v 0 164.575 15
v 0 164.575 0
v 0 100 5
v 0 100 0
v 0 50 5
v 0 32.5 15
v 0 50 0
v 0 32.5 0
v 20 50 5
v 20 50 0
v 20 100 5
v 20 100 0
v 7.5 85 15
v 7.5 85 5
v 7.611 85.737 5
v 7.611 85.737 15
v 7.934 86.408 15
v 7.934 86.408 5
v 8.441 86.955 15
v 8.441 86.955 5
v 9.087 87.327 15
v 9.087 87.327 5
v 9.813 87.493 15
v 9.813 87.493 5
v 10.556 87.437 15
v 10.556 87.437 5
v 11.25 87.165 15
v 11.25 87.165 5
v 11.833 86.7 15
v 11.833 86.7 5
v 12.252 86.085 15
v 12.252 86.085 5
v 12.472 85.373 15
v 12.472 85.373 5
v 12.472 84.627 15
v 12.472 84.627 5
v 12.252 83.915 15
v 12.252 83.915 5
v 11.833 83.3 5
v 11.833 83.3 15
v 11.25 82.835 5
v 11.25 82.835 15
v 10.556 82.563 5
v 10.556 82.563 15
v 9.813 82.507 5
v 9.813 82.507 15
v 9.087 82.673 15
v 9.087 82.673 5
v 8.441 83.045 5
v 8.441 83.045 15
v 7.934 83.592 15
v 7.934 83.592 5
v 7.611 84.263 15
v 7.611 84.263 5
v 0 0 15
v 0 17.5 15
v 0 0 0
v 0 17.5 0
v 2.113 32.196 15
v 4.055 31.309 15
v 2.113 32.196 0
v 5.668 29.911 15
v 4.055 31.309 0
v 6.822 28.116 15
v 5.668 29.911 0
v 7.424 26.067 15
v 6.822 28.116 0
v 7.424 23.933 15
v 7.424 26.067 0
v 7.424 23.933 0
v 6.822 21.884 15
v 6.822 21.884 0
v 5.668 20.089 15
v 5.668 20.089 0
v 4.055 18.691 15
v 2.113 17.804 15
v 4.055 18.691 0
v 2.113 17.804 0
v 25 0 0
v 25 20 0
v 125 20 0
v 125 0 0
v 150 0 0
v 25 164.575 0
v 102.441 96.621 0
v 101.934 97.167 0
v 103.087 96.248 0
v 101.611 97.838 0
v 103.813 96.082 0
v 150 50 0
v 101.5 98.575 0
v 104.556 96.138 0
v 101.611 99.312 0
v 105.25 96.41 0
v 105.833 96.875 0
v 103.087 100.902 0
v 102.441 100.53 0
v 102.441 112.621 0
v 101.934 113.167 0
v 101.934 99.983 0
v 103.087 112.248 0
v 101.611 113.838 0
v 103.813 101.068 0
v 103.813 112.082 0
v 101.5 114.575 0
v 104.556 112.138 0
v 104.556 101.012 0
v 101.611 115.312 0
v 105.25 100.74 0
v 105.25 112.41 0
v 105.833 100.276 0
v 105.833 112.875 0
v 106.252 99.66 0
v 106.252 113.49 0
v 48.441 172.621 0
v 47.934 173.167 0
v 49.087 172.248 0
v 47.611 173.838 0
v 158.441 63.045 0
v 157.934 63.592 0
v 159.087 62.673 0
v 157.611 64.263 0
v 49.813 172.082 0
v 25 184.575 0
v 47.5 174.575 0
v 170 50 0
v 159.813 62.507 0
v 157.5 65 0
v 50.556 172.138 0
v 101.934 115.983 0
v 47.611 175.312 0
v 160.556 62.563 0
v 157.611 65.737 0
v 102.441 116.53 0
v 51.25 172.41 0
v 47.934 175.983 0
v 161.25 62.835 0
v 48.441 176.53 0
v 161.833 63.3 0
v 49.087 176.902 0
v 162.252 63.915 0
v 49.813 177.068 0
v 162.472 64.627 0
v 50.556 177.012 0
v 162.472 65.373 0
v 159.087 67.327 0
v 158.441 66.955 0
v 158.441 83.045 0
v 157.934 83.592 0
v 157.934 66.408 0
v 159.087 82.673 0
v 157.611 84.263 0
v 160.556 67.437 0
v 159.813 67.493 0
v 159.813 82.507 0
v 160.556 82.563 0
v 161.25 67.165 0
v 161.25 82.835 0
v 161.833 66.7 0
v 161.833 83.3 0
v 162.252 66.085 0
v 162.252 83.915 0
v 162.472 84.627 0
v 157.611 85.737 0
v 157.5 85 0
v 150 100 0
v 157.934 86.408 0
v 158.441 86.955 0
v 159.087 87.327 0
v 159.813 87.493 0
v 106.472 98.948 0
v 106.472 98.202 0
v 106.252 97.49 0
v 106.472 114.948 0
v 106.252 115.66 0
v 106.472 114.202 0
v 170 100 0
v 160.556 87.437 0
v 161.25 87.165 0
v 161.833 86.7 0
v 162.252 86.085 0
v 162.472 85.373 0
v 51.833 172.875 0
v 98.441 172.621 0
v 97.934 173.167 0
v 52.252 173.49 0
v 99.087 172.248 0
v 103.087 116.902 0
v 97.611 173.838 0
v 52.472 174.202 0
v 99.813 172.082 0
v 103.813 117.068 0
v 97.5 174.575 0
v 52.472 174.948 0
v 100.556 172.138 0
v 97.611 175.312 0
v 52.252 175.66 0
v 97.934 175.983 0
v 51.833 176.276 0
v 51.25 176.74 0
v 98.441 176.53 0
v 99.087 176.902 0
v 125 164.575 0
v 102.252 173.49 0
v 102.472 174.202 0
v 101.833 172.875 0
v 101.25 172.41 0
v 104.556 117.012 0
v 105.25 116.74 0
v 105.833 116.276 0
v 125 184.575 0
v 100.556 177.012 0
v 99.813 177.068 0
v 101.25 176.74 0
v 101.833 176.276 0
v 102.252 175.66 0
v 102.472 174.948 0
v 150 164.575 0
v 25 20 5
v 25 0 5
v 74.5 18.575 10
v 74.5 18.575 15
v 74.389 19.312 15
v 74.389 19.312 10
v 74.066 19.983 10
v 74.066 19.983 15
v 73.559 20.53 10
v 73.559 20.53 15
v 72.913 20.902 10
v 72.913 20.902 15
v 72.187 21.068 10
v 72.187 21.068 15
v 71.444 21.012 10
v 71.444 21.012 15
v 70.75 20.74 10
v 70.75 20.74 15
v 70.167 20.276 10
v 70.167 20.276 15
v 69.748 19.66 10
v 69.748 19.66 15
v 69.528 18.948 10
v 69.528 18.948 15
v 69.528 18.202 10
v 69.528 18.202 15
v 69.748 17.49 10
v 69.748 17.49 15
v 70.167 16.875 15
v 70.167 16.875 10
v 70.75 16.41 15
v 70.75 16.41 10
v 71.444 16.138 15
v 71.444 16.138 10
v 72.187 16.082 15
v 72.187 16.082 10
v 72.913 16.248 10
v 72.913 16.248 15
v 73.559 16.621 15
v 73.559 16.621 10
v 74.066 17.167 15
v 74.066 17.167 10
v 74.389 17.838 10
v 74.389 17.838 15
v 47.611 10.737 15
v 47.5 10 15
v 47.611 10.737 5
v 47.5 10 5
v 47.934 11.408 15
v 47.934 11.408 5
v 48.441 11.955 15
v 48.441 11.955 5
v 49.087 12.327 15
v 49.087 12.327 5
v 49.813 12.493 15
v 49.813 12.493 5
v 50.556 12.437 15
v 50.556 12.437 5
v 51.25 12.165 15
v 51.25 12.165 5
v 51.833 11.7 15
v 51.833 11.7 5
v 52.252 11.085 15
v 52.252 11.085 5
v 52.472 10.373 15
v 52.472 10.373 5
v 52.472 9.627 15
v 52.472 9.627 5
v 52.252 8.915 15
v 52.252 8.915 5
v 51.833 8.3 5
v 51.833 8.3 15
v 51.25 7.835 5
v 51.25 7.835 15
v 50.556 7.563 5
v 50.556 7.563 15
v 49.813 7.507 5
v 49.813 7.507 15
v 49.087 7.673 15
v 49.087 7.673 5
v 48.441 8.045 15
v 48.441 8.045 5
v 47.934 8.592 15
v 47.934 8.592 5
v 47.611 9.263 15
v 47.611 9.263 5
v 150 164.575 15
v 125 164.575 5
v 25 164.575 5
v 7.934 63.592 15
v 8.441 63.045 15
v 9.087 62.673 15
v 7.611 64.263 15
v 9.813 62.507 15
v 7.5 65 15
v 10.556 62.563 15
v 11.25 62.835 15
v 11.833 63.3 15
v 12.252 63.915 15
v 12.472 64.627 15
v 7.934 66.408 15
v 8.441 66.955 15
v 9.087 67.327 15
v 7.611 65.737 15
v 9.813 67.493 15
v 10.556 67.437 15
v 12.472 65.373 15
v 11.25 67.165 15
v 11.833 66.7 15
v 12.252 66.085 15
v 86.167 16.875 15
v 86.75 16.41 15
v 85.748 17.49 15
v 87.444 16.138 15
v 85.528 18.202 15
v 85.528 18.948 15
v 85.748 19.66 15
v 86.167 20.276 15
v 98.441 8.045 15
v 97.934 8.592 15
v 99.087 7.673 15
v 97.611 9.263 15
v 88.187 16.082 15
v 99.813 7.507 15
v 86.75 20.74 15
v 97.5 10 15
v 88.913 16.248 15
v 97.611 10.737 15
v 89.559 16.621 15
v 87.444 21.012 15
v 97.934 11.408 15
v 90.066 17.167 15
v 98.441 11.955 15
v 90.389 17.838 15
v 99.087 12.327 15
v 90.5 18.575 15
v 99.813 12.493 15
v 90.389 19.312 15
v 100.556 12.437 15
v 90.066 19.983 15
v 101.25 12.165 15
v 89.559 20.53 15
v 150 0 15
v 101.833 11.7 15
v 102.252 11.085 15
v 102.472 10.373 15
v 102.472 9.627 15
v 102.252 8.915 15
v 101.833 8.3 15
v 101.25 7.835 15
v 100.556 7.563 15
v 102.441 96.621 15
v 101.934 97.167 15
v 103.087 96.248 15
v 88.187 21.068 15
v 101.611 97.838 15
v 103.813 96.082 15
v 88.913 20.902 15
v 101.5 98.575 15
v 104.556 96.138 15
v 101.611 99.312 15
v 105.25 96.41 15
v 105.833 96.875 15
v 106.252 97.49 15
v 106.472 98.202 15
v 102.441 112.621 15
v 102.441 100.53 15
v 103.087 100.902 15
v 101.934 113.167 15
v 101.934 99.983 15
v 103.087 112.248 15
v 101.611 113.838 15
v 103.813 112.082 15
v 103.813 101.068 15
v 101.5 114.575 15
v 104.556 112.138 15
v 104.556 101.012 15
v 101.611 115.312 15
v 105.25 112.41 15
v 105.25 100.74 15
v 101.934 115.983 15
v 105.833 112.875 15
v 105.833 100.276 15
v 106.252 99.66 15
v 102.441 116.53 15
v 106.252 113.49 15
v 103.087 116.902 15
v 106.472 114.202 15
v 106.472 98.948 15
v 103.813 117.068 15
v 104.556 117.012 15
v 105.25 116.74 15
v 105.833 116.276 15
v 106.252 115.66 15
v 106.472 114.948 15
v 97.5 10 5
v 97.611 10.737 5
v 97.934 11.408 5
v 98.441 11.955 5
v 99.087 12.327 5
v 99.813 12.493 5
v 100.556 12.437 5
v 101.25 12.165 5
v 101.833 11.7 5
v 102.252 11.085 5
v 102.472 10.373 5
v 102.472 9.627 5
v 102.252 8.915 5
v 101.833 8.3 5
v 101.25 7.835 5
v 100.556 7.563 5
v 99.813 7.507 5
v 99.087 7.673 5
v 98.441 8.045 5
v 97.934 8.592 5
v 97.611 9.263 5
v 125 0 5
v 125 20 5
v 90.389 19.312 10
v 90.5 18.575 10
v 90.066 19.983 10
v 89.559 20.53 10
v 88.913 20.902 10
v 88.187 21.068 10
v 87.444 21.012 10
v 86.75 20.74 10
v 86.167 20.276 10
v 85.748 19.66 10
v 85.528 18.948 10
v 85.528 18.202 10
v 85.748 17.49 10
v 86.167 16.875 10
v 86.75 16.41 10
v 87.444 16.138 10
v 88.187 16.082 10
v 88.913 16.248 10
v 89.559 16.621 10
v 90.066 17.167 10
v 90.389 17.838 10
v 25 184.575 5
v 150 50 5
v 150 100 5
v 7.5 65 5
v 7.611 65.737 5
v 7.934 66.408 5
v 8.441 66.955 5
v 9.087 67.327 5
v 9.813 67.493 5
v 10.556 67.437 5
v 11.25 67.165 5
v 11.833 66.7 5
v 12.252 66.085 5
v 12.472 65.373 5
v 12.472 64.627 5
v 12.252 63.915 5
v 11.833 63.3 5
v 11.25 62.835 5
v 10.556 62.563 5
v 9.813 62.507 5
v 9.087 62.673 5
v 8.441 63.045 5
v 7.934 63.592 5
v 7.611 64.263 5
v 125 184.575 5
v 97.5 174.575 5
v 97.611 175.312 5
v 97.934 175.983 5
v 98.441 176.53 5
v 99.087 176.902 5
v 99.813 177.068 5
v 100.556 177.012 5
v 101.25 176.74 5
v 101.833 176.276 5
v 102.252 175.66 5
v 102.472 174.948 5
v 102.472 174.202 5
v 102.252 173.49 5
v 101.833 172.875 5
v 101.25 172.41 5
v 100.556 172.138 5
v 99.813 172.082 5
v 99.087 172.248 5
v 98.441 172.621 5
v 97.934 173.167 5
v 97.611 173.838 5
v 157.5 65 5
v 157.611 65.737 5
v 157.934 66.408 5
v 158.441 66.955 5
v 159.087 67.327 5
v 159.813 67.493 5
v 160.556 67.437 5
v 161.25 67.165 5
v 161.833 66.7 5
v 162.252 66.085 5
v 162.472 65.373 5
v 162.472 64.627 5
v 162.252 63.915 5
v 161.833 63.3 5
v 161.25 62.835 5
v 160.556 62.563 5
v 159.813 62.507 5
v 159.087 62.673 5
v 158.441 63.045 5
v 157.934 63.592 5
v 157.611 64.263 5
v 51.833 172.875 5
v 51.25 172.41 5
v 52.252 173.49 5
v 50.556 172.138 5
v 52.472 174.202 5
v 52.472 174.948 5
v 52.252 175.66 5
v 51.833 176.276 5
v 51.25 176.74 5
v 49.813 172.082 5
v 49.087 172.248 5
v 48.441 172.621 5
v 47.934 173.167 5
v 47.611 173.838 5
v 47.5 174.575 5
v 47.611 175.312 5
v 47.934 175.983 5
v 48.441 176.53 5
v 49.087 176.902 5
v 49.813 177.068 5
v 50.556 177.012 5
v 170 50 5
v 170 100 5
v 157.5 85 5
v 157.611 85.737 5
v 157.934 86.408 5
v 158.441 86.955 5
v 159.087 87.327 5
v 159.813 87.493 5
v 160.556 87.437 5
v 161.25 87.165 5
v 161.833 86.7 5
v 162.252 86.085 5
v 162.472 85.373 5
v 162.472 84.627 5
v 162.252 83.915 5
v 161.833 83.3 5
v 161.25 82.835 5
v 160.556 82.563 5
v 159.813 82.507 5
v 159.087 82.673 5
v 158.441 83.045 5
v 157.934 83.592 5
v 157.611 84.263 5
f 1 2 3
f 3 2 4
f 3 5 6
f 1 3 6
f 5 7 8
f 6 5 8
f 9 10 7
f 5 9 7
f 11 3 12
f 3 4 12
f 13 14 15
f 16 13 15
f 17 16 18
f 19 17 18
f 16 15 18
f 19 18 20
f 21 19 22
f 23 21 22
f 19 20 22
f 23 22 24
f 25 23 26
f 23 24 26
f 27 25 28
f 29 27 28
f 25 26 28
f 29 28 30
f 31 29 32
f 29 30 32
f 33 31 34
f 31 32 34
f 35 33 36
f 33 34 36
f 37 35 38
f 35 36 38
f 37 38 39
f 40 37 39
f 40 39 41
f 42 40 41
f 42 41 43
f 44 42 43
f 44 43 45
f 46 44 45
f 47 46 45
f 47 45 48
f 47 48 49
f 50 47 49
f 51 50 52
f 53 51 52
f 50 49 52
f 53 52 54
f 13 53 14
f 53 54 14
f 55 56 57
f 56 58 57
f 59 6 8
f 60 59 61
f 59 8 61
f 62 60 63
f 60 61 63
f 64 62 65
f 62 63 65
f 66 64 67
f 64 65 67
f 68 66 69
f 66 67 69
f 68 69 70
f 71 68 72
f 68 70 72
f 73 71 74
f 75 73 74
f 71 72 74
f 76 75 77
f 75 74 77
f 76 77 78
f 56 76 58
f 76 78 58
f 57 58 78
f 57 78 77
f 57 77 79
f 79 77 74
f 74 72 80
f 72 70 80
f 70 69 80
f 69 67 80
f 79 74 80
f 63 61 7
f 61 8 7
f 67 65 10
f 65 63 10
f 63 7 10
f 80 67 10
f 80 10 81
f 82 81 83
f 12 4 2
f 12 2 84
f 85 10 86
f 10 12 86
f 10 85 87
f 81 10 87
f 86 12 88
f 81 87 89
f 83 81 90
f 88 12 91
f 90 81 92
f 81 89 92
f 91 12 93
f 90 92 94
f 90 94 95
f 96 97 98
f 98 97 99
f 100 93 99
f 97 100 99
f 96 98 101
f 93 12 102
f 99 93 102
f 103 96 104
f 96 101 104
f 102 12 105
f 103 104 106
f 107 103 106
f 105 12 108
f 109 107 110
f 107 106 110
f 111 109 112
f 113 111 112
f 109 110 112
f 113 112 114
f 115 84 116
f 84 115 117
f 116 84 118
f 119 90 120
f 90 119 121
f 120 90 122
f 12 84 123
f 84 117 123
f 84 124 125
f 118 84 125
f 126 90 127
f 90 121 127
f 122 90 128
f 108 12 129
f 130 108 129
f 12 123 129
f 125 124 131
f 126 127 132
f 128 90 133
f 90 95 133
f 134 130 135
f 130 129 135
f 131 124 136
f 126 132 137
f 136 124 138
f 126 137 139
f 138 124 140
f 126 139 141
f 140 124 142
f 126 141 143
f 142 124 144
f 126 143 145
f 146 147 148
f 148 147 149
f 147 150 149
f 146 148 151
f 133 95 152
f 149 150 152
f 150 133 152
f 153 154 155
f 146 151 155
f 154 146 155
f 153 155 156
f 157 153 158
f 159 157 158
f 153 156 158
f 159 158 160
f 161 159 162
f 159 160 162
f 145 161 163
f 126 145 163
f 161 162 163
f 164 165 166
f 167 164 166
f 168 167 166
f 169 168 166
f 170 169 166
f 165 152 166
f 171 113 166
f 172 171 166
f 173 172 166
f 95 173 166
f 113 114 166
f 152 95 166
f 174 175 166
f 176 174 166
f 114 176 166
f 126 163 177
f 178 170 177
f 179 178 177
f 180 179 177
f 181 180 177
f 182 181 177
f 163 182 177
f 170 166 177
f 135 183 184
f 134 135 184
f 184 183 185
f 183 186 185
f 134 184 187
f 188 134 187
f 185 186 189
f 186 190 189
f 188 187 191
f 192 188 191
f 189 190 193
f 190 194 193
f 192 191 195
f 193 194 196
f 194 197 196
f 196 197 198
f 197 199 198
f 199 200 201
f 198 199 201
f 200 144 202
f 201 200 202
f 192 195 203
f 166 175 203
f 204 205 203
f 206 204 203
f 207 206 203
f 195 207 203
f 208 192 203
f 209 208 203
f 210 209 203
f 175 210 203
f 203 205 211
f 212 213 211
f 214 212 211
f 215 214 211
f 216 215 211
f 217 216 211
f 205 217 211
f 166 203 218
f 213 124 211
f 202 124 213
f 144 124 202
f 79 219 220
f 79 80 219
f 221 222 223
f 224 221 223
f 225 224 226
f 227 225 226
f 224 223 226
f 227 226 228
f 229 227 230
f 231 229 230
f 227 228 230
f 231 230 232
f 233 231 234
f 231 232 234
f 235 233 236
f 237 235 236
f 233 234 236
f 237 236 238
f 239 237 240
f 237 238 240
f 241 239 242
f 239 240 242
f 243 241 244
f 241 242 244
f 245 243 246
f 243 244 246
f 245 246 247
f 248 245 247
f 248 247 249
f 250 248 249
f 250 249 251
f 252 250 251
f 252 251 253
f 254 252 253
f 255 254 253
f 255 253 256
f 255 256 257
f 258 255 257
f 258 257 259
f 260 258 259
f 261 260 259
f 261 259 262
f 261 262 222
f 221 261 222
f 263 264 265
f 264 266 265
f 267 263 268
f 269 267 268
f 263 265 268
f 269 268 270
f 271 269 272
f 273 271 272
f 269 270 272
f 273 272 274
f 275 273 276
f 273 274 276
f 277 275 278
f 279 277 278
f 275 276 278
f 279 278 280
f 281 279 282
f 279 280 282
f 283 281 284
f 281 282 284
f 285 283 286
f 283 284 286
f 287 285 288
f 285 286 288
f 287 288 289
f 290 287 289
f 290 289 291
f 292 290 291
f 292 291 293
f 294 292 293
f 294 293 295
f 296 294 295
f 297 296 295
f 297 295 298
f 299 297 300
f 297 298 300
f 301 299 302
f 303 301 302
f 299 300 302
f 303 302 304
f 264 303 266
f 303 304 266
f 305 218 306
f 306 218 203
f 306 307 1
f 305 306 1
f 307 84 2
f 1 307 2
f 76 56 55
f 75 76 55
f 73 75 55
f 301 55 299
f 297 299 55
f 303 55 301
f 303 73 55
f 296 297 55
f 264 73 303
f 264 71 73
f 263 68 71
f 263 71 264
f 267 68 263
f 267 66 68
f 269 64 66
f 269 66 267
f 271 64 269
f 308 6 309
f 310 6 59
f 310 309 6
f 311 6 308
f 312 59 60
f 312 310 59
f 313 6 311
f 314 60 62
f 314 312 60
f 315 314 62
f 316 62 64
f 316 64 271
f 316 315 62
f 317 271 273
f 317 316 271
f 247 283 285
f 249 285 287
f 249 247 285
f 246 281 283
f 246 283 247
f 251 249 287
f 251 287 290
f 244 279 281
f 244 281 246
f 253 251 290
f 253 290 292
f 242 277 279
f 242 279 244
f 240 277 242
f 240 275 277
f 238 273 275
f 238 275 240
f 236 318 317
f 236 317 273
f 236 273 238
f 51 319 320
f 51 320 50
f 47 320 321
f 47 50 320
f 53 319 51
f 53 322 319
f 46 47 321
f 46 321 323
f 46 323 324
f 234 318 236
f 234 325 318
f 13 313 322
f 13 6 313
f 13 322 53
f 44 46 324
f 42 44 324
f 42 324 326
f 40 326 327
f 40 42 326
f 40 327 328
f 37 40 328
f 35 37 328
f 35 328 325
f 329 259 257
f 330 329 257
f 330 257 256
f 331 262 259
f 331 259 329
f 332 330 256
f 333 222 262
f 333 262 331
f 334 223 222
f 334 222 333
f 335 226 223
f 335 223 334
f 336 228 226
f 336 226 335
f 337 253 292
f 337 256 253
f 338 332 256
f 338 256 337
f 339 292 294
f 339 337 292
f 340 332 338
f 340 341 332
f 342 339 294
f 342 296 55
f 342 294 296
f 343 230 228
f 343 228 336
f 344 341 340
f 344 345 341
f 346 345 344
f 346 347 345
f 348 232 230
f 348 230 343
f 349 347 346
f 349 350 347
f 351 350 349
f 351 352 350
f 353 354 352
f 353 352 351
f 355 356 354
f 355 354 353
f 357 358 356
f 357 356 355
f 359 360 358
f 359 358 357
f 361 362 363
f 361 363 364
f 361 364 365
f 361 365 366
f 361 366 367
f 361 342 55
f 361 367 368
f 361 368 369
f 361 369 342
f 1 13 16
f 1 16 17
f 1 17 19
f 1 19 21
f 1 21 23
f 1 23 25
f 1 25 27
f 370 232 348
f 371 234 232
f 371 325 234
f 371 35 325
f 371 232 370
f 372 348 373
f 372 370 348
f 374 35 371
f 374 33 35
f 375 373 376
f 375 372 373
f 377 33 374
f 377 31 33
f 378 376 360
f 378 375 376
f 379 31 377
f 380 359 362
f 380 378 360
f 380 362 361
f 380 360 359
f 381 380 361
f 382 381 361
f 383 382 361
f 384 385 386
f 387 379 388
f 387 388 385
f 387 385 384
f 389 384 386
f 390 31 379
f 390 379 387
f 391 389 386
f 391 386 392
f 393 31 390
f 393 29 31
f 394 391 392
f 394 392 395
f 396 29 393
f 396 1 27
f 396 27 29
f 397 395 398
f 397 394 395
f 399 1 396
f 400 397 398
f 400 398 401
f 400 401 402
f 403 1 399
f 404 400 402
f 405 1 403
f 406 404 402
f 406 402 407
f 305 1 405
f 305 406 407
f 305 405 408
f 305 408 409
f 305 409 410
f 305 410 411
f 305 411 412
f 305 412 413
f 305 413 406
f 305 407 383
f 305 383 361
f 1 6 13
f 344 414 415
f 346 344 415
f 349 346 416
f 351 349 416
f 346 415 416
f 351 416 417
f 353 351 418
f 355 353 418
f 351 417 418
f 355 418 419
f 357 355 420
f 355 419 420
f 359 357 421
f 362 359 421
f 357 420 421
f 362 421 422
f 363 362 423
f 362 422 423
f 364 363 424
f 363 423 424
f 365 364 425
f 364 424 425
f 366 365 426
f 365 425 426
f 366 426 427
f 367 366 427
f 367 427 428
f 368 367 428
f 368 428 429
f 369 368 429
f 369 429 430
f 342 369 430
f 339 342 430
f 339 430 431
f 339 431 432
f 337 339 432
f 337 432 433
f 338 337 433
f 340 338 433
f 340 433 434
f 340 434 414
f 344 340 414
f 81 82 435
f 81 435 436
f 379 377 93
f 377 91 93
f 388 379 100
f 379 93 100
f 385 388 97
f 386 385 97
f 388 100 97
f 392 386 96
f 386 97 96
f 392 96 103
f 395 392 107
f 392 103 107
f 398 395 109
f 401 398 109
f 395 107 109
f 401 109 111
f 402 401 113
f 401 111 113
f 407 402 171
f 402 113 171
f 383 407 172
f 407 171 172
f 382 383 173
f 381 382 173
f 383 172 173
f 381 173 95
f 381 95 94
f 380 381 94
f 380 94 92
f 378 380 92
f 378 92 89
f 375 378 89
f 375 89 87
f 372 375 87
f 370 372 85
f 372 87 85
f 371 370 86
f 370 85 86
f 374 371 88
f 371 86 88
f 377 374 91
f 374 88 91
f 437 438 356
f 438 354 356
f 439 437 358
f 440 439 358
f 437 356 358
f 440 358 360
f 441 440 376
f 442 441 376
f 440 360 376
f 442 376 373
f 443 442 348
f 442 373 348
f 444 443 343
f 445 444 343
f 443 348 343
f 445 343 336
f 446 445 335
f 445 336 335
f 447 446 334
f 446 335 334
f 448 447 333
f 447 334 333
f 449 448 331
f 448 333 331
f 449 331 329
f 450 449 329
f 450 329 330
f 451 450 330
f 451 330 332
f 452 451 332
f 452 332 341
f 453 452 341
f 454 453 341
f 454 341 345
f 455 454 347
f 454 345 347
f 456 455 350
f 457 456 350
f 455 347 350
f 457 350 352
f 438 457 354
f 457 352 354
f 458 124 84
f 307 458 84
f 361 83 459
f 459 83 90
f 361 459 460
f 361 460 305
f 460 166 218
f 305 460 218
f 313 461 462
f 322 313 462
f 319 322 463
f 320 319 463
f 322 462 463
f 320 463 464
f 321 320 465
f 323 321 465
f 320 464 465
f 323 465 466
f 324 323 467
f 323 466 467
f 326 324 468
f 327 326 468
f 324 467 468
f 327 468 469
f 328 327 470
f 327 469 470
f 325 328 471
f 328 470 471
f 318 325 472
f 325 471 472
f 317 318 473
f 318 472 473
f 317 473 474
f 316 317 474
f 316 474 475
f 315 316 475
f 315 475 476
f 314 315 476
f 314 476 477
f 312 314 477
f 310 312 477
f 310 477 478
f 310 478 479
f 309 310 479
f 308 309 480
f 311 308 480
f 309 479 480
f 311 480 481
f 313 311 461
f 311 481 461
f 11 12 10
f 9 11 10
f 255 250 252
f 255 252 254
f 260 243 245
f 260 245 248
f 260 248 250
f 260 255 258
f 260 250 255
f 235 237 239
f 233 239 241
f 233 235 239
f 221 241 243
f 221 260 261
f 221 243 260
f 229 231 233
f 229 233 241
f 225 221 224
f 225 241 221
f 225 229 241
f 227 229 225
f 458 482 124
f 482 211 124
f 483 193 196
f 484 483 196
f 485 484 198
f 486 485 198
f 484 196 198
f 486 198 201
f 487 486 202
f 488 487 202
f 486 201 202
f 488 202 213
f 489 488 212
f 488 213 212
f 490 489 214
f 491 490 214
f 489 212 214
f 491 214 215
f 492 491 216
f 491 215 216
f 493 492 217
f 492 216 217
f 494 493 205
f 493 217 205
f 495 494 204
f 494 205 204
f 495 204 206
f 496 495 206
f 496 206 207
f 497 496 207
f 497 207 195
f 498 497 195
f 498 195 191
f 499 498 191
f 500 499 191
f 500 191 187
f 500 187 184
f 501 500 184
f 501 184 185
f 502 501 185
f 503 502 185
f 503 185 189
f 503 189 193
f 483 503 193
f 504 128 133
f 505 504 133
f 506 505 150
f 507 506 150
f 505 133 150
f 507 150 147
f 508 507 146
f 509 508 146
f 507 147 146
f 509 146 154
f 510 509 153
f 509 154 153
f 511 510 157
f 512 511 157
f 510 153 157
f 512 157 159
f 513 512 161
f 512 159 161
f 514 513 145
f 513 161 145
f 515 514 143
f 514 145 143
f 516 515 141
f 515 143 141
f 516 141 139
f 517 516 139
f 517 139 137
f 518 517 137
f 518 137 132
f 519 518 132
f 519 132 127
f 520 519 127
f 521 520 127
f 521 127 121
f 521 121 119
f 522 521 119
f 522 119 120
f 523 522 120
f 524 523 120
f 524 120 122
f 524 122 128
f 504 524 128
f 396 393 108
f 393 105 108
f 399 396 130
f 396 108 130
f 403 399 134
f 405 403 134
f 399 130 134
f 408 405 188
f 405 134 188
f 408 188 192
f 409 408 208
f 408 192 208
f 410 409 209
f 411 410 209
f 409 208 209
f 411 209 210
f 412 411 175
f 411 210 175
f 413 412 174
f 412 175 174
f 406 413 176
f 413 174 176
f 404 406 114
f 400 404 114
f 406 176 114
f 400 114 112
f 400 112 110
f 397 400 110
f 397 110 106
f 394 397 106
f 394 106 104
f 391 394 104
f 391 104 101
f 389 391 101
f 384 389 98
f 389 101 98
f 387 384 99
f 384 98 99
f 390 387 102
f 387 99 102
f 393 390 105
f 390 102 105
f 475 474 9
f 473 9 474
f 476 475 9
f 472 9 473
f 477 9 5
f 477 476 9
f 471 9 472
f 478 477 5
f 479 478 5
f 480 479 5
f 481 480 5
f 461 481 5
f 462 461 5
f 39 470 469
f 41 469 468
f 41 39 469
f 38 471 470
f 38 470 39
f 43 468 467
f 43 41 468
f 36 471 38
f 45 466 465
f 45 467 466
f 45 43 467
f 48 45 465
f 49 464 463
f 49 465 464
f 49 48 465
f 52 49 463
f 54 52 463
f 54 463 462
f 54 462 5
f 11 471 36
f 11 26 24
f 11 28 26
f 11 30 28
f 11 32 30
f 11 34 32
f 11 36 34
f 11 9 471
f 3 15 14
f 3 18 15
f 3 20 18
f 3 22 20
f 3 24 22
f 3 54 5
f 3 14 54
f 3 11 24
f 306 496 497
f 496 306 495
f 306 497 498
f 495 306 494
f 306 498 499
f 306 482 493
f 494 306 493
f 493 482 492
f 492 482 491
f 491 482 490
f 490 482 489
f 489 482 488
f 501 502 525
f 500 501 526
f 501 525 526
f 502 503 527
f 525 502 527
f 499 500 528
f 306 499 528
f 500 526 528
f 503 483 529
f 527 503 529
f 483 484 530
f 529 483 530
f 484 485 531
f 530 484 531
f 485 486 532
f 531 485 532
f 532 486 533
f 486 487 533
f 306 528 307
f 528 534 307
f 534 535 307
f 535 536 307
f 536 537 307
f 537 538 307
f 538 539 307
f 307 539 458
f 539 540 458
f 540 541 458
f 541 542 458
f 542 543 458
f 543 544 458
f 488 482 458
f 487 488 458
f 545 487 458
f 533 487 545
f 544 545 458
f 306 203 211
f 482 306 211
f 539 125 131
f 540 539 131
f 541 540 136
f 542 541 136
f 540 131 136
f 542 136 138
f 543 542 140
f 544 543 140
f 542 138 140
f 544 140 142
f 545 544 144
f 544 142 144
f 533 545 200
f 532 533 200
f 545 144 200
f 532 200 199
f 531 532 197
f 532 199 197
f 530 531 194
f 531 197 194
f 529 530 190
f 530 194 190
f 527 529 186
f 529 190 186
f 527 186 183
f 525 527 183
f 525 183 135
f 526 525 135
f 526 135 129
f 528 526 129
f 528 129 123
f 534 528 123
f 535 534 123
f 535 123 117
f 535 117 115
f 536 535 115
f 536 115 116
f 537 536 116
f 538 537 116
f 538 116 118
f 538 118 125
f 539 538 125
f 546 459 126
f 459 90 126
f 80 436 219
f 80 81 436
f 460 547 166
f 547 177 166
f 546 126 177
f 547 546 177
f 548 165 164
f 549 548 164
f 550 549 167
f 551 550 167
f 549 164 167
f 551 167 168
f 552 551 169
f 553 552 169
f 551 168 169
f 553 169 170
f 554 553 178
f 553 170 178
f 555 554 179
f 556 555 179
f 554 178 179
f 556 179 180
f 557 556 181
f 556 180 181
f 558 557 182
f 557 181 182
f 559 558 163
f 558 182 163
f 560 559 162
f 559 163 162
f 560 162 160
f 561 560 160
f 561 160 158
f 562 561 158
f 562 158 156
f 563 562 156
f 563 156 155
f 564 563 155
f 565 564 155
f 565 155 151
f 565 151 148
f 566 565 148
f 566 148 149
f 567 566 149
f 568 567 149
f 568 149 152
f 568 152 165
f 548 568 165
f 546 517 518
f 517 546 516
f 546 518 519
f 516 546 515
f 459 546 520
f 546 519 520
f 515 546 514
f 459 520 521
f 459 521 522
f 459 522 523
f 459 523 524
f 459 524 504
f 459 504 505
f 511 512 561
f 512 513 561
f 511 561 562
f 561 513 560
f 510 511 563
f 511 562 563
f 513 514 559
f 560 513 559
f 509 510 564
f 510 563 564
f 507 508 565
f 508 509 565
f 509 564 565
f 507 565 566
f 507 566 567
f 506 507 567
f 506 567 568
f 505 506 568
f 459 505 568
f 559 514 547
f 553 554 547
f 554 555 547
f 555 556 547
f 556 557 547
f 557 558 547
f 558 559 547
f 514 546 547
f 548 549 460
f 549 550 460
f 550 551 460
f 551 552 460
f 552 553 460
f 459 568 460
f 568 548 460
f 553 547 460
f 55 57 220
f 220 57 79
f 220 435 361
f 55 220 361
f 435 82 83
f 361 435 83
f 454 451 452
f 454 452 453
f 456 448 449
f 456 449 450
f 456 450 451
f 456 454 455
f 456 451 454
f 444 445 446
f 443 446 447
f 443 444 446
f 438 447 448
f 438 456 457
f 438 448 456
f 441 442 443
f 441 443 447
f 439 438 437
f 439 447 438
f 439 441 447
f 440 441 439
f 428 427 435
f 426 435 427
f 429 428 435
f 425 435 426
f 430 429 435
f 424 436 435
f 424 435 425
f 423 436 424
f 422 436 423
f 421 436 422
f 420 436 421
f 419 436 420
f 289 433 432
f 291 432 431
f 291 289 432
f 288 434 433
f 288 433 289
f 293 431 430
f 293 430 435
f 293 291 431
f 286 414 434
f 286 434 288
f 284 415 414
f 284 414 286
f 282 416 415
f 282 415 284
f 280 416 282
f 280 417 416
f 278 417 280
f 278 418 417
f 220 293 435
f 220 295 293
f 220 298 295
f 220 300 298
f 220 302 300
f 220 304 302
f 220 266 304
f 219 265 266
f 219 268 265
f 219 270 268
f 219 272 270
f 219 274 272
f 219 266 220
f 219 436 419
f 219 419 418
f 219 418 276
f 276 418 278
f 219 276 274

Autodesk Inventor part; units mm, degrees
ref_plane "YZ Plane" through (0, 0, 0) normal (1, 0, 0) x (0, 1, 0)
ref_plane "XZ Plane" through (0, 0, 0) normal (0, 1, 0) x (-1, 0, 0)
ref_plane "XY Plane" through (0, 0, 0) normal (0, 0, 1) x (1, 0, 0)
sketch "Sketch1" plane through (0, 0, 0) normal (0, 0, 1) x (1, 0, 0)
  line L0 (0, 0) -> (150, 0)
  line L1 (150, 0) -> (150, 164.5751)
  line L2 (150, 164.5751) -> (0, 164.5751)
  line L3 (0, 164.5751) -> (0, 0)
  dimension "d0" = 150
  dimension "d1" = 164.5751
extrude "Extrusion1" add sketch "Sketch1" along normal blind 15
sketch "Sketch7" plane through (0, 0, 0) normal (0, 0, -1) x (-1, 0, 0)
  line L0 (-20, 50) -> (0, 50)
  line L1 (0, 50) -> (0, 100)
  line L2 (0, 100) -> (-20, 100)
  line L3 (-20, 100) -> (-20, 50)
  line L4 (0, 164.5751) -> (0, 0) projected
  dimension "d27" = 20
  dimension "d28" = 50
  dimension "d96" = 50
extrude "Extrusion7" cut sketch "Sketch7" against normal blind 5
sketch "Sketch8" plane through (0, 0, 0) normal (0, 0, -1) x (-1, 0, 0)
  line L0 (-150, 164.5751) -> (0, 164.5751) projected
  line L1 (-25, 164.5751) -> (-125, 164.5751)
  line L2 (-125, 164.5751) -> (-125, 184.5751)
  line L3 (-125, 184.5751) -> (-25, 184.5751)
  line L4 (-25, 184.5751) -> (-25, 164.5751)
  point P0 (0, 0)
  dimension "d37" = 100
  dimension "d38" = 20
  dimension "d126" = 25
extrude "Extrusion8" add sketch "Sketch8" against normal blind 5
sketch "Sketch9" plane through (0, 0, 0) normal (0, 0, -1) x (-1, 0, 0)
  circle A0 centre (-50, 174.5751) radius 2.5
  circle A1 centre (-100, 174.5751) radius 2.5
  line L0 (-125, 184.5751) -> (-25, 184.5751) projected
  line L1 (0, 100) -> (0, 50) projected
  line L2 (0, 25) -> (20, 25) projected
  line L3 (20, 75) -> (0, 75) projected
  point P0 (0, 0)
  dimension "d44" = 5
  dimension "d45" = 5
  dimension "d46" = 10
extrude "Extrusion9" cut sketch "Sketch9" against normal through all
thread "Thread1" size "M5x0.8" class "6H" standard "ANSI Metric M Profile" full length
thread "Thread2" size "M5x0.8" class "6H" standard "ANSI Metric M Profile" full length
sketch "Sketch12" plane through (0, 0, 0) normal (0, 0, -1) x (-1, 0, 0)
  line L0 (0, 0) -> (-150, 0) projected
  line L1 (-25, 0) -> (-125, 0)
  line L2 (-125, 0) -> (-125, 20)
  line L3 (-125, 20) -> (-25, 20)
  line L4 (-25, 20) -> (-25, 0)
  dimension "d79" = 100
  dimension "d80" = 20
  dimension "d81" = 25
extrude "Extrusion12" cut sketch "Sketch12" against normal blind 5
sketch "Sketch13" plane through (0, 0, 5) normal (0, 0, -1) x (-1, 0, 0)
  circle A0 centre (-50, 10) radius 2.5
  circle A1 centre (-100, 10) radius 2.5
  line L0 (-25, 20) -> (-25, 0) projected
  line L1 (-125, 0) -> (-125, 20) projected
  line L2 (-125, 20) -> (-25, 20) projected
  point P0 (0, 0)
  dimension "d84" = 5
  dimension "d85" = 5
  dimension "d86" = 25
  dimension "d87" = 25
  dimension "d88" = 10
  dimension "d89" = 10
extrude "Extrusion13" cut sketch "Sketch13" against normal through all
thread "Thread9" size "M5x0.8" class "6H" standard "ANSI Metric M Profile" full length
thread "Thread10" size "M5x0.8" class "6H" standard "ANSI Metric M Profile" full length
sketch "Sketch14" plane through (0, 0, 5) normal (0, 0, -1) x (-1, 0, 0)
  circle A0 centre (-10, 65) radius 2.5
  circle A1 centre (-10, 85) radius 2.5
  line L0 (-20, 50) -> (-20, 100) projected
  line L1 (0, 50) -> (-20, 50) projected
  line L2 (-20, 100) -> (0, 100) projected
  point P0 (0, 0)
  dimension "d97" = 5
  dimension "d98" = 5
  dimension "d99" = 10
  dimension "d100" = 15
  dimension "d101" = 15
  dimension "d102" = 10
extrude "Extrusion14" cut sketch "Sketch14" against normal through all
thread "Thread11" size "M5x0.8" class "6H" standard "ANSI Metric M Profile" full length
thread "Thread12" size "M5x0.8" class "6H" standard "ANSI Metric M Profile" full length
sketch "Sketch15" plane through (0, 0, 0) normal (0, 0, -1) x (-1, 0, 0)
  line L0 (-150, 0) -> (-150, 164.5751) projected
  line L1 (-150, 50) -> (-170, 50)
  line L2 (-170, 50) -> (-170, 100)
  line L3 (-170, 100) -> (-150, 100)
  line L4 (-150, 100) -> (-150, 50)
  point P0 (0, 0)
  dimension "d109" = 20
  dimension "d110" = 50
  dimension "d111" = 50
extrude "Extrusion15" add sketch "Sketch15" against normal blind 5
sketch "Sketch16" plane through (0, 0, 0) normal (0, 0, -1) x (-1, 0, 0)
  circle A0 centre (-160, 65) radius 2.5
  circle A1 centre (-160, 85) radius 2.5
  line L0 (-170, 50) -> (-170, 100) projected
  line L1 (-150, 50) -> (-170, 50) projected
  line L2 (-170, 100) -> (-150, 100) projected
  point P0 (0, 0)
  dimension "d114" = 5
  dimension "d115" = 5
  dimension "d116" = 10
  dimension "d117" = 10
  dimension "d118" = 15
  dimension "d119" = 15
extrude "Extrusion16" cut sketch "Sketch16" against normal through all
thread "Thread13" size "M5x0.8" class "6H" standard "ANSI Metric M Profile" full length
thread "Thread14" size "M5x0.8" class "6H" standard "ANSI Metric M Profile" full length
sketch "Sketch17" plane through (0, 0, 0) normal (0, 0, -1) x (-1, 0, 0)
  circle A0 centre (-104, 98.5751) radius 2.5
  circle A1 centre (-104, 114.5751) radius 2.5
  line L0 (-150, 0) -> (-150, 50) projected
  line L1 (-150, 164.5751) -> (0, 164.5751) projected
  line L2 (0, 164.5751) -> (0, 0) projected
  dimension "d127" = 5
  dimension "d128" = 5
  dimension "d130" = 16
  dimension "d145" = 50
  dimension "d146" = 104
extrude "Extrusion17" cut sketch "Sketch17" against normal through all
thread "Thread17" size "M5x0.8" class "6H" standard "ANSI Metric M Profile" full length
thread "Thread18" size "M5x0.8" class "6H" standard "ANSI Metric M Profile" full length
sketch "Sketch18" plane through (0, 0, 0) normal (0, 0, -1) x (-1, 0, 0)
  line L0 (0, 50) -> (0, 0) projected
  circle A0 centre (0, 25) radius 7.5
  dimension "d142" = 15
extrude "Extrusion18" cut sketch "Sketch18" against normal through all
sketch "Sketch19" plane through (0, 0, 15) normal (0, 0, 1) x (1, 0, 0)
  circle A0 centre (88, 18.5751) radius 2.5
  circle A1 centre (72, 18.5751) radius 2.5
  circle A2 centre (104, 114.5751) radius 2.5 projected
  circle A3 centre (104, 98.5751) radius 2.5 projected
  point P0 (0, 0)
  dimension "d147" = 5
  dimension "d148" = 5
  dimension "d149" = 16
  dimension "d150" = 16
  dimension "d151" = 80
extrude "Extrusion19" cut sketch "Sketch19" against normal blind 5 contours A0 | A1
thread "Thread19" size "M5x0.8" class "6H" standard "ANSI Metric M Profile" full length
thread "Thread20" size "M5x0.8" class "6H" standard "ANSI Metric M Profile" full length
properties part number "CP007" material "ABS Plastic"
